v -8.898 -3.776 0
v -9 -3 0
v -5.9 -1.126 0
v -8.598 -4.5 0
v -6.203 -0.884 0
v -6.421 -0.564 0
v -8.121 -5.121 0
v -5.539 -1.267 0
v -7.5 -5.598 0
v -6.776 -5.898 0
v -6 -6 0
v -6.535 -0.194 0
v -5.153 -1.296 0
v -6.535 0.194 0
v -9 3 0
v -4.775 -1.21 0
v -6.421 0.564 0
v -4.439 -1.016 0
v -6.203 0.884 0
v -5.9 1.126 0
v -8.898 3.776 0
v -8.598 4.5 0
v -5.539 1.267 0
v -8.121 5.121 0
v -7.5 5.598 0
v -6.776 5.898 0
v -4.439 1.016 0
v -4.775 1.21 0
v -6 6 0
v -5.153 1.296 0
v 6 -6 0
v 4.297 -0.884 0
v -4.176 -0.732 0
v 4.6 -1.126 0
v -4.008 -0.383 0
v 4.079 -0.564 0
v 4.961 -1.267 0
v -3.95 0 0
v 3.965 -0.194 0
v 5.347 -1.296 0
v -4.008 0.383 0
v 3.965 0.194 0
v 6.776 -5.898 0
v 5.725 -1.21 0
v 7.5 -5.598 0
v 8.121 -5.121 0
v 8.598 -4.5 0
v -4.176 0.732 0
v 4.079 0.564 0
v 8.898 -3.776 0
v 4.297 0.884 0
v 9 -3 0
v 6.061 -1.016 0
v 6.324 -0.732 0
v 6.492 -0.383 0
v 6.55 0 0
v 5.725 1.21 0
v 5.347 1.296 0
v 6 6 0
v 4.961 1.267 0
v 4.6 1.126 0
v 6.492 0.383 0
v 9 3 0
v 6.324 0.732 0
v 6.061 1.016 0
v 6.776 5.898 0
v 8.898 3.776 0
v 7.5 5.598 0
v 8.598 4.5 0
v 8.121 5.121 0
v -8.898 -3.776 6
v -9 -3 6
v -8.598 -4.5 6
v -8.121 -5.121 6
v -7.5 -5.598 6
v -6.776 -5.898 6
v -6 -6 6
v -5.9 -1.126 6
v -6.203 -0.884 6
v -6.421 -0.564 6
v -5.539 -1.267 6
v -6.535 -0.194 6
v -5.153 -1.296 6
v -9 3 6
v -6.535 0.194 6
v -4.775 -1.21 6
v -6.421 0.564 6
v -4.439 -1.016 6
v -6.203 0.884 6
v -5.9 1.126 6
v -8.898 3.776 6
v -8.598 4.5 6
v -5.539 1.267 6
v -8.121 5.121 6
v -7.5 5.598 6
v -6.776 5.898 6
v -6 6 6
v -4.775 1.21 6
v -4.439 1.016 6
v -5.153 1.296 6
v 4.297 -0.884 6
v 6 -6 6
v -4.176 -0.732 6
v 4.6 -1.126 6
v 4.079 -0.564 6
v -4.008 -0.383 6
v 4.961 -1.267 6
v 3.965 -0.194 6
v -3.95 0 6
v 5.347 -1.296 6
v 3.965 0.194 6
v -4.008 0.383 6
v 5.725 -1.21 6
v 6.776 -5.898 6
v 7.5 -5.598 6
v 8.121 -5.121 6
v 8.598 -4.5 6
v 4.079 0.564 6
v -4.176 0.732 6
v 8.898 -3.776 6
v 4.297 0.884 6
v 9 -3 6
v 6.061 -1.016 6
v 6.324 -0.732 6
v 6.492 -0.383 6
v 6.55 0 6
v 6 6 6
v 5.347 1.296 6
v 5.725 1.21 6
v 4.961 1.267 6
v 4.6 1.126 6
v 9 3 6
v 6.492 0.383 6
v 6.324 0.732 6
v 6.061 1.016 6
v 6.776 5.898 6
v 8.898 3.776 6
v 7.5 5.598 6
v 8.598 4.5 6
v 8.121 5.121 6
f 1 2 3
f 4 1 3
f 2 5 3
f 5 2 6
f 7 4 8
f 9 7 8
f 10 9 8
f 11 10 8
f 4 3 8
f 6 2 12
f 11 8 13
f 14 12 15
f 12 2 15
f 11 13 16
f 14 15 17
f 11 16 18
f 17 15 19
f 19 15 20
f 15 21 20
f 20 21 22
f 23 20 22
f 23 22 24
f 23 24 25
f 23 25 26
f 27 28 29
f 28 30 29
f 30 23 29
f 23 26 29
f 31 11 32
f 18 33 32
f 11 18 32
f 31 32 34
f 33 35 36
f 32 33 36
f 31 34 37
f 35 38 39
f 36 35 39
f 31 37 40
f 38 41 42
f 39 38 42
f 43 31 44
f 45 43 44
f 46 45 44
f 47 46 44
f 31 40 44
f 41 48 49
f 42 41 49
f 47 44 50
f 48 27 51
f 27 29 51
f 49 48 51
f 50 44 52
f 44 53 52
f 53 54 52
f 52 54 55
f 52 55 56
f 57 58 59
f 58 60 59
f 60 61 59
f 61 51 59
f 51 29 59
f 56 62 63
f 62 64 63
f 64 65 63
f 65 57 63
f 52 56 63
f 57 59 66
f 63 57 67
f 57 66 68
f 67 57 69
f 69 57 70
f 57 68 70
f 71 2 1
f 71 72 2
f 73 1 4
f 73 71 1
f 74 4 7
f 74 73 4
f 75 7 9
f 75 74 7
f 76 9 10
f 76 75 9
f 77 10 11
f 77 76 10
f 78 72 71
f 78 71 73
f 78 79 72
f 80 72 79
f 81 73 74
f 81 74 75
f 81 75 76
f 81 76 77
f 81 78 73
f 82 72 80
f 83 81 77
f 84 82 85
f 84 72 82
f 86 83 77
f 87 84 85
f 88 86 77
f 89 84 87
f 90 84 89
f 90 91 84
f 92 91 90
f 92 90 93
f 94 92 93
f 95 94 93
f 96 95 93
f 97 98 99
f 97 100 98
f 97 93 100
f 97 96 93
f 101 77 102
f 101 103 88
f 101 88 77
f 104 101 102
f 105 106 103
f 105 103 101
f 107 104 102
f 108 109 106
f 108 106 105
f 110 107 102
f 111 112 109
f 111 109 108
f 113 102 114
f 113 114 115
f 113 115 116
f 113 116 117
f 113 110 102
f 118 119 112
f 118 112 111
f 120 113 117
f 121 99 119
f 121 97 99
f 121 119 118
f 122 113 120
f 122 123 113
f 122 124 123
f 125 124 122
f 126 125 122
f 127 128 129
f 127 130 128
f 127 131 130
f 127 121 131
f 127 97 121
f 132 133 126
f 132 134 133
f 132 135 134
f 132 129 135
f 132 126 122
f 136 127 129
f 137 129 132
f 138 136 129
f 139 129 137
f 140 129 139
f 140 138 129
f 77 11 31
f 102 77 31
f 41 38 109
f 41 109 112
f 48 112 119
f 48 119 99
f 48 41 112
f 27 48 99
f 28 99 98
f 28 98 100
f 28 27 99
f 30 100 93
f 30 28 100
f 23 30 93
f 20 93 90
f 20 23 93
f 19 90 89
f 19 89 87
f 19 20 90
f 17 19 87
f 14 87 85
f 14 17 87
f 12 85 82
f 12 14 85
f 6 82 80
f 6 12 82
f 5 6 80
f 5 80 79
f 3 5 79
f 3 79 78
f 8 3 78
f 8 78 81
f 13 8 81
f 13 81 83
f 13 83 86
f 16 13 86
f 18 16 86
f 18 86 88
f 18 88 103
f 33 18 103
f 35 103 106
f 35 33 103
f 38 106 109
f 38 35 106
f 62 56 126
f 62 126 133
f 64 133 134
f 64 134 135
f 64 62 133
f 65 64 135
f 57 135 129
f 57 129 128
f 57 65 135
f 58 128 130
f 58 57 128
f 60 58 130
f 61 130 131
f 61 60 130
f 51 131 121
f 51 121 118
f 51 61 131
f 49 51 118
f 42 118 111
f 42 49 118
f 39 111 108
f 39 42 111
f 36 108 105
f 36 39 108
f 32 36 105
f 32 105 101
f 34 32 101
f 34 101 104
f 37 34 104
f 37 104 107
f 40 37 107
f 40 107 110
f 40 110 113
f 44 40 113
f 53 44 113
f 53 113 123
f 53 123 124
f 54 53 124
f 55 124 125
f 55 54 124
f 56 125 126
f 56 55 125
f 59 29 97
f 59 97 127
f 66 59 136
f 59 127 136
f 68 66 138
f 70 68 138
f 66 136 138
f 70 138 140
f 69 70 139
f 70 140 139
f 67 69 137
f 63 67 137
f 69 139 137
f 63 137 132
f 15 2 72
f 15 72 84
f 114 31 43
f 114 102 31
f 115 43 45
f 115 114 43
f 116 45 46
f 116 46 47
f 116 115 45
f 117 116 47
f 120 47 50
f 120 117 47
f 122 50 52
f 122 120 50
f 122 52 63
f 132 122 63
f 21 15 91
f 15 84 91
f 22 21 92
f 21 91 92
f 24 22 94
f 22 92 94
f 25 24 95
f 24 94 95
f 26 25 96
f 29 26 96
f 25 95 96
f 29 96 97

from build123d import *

# Parameters (mm, degrees)
CROQUIS2_W              = 18
CROQUIS2_H              = 12
CROQUIS2_R              = 1.3
SALIENTE_EXTRUIR1_DEPTH = 6
REDONDEO1_R             = 3


with BuildPart() as part:
    # Croquis2 → Saliente-Extruir1 (new body)
    with BuildSketch(Plane.XY):
        Rectangle(CROQUIS2_W, CROQUIS2_H)
        with Locations((-5.25, 0)):
            Circle(CROQUIS2_R, mode=Mode.SUBTRACT)
        with Locations((5.25, 0)):
            Circle(CROQUIS2_R, mode=Mode.SUBTRACT)
    extrude(amount=SALIENTE_EXTRUIR1_DEPTH)

    # Redondeo1
    redondeo1_edges = [part.edges().sort_by_distance(p)[0] for p in [
        (-9, 6, 3),
        (9, 6, 3),
        (9, -6, 3),
        (-9, -6, 3),
    ]]
    fillet(redondeo1_edges, radius=REDONDEO1_R)


solid = part.part
